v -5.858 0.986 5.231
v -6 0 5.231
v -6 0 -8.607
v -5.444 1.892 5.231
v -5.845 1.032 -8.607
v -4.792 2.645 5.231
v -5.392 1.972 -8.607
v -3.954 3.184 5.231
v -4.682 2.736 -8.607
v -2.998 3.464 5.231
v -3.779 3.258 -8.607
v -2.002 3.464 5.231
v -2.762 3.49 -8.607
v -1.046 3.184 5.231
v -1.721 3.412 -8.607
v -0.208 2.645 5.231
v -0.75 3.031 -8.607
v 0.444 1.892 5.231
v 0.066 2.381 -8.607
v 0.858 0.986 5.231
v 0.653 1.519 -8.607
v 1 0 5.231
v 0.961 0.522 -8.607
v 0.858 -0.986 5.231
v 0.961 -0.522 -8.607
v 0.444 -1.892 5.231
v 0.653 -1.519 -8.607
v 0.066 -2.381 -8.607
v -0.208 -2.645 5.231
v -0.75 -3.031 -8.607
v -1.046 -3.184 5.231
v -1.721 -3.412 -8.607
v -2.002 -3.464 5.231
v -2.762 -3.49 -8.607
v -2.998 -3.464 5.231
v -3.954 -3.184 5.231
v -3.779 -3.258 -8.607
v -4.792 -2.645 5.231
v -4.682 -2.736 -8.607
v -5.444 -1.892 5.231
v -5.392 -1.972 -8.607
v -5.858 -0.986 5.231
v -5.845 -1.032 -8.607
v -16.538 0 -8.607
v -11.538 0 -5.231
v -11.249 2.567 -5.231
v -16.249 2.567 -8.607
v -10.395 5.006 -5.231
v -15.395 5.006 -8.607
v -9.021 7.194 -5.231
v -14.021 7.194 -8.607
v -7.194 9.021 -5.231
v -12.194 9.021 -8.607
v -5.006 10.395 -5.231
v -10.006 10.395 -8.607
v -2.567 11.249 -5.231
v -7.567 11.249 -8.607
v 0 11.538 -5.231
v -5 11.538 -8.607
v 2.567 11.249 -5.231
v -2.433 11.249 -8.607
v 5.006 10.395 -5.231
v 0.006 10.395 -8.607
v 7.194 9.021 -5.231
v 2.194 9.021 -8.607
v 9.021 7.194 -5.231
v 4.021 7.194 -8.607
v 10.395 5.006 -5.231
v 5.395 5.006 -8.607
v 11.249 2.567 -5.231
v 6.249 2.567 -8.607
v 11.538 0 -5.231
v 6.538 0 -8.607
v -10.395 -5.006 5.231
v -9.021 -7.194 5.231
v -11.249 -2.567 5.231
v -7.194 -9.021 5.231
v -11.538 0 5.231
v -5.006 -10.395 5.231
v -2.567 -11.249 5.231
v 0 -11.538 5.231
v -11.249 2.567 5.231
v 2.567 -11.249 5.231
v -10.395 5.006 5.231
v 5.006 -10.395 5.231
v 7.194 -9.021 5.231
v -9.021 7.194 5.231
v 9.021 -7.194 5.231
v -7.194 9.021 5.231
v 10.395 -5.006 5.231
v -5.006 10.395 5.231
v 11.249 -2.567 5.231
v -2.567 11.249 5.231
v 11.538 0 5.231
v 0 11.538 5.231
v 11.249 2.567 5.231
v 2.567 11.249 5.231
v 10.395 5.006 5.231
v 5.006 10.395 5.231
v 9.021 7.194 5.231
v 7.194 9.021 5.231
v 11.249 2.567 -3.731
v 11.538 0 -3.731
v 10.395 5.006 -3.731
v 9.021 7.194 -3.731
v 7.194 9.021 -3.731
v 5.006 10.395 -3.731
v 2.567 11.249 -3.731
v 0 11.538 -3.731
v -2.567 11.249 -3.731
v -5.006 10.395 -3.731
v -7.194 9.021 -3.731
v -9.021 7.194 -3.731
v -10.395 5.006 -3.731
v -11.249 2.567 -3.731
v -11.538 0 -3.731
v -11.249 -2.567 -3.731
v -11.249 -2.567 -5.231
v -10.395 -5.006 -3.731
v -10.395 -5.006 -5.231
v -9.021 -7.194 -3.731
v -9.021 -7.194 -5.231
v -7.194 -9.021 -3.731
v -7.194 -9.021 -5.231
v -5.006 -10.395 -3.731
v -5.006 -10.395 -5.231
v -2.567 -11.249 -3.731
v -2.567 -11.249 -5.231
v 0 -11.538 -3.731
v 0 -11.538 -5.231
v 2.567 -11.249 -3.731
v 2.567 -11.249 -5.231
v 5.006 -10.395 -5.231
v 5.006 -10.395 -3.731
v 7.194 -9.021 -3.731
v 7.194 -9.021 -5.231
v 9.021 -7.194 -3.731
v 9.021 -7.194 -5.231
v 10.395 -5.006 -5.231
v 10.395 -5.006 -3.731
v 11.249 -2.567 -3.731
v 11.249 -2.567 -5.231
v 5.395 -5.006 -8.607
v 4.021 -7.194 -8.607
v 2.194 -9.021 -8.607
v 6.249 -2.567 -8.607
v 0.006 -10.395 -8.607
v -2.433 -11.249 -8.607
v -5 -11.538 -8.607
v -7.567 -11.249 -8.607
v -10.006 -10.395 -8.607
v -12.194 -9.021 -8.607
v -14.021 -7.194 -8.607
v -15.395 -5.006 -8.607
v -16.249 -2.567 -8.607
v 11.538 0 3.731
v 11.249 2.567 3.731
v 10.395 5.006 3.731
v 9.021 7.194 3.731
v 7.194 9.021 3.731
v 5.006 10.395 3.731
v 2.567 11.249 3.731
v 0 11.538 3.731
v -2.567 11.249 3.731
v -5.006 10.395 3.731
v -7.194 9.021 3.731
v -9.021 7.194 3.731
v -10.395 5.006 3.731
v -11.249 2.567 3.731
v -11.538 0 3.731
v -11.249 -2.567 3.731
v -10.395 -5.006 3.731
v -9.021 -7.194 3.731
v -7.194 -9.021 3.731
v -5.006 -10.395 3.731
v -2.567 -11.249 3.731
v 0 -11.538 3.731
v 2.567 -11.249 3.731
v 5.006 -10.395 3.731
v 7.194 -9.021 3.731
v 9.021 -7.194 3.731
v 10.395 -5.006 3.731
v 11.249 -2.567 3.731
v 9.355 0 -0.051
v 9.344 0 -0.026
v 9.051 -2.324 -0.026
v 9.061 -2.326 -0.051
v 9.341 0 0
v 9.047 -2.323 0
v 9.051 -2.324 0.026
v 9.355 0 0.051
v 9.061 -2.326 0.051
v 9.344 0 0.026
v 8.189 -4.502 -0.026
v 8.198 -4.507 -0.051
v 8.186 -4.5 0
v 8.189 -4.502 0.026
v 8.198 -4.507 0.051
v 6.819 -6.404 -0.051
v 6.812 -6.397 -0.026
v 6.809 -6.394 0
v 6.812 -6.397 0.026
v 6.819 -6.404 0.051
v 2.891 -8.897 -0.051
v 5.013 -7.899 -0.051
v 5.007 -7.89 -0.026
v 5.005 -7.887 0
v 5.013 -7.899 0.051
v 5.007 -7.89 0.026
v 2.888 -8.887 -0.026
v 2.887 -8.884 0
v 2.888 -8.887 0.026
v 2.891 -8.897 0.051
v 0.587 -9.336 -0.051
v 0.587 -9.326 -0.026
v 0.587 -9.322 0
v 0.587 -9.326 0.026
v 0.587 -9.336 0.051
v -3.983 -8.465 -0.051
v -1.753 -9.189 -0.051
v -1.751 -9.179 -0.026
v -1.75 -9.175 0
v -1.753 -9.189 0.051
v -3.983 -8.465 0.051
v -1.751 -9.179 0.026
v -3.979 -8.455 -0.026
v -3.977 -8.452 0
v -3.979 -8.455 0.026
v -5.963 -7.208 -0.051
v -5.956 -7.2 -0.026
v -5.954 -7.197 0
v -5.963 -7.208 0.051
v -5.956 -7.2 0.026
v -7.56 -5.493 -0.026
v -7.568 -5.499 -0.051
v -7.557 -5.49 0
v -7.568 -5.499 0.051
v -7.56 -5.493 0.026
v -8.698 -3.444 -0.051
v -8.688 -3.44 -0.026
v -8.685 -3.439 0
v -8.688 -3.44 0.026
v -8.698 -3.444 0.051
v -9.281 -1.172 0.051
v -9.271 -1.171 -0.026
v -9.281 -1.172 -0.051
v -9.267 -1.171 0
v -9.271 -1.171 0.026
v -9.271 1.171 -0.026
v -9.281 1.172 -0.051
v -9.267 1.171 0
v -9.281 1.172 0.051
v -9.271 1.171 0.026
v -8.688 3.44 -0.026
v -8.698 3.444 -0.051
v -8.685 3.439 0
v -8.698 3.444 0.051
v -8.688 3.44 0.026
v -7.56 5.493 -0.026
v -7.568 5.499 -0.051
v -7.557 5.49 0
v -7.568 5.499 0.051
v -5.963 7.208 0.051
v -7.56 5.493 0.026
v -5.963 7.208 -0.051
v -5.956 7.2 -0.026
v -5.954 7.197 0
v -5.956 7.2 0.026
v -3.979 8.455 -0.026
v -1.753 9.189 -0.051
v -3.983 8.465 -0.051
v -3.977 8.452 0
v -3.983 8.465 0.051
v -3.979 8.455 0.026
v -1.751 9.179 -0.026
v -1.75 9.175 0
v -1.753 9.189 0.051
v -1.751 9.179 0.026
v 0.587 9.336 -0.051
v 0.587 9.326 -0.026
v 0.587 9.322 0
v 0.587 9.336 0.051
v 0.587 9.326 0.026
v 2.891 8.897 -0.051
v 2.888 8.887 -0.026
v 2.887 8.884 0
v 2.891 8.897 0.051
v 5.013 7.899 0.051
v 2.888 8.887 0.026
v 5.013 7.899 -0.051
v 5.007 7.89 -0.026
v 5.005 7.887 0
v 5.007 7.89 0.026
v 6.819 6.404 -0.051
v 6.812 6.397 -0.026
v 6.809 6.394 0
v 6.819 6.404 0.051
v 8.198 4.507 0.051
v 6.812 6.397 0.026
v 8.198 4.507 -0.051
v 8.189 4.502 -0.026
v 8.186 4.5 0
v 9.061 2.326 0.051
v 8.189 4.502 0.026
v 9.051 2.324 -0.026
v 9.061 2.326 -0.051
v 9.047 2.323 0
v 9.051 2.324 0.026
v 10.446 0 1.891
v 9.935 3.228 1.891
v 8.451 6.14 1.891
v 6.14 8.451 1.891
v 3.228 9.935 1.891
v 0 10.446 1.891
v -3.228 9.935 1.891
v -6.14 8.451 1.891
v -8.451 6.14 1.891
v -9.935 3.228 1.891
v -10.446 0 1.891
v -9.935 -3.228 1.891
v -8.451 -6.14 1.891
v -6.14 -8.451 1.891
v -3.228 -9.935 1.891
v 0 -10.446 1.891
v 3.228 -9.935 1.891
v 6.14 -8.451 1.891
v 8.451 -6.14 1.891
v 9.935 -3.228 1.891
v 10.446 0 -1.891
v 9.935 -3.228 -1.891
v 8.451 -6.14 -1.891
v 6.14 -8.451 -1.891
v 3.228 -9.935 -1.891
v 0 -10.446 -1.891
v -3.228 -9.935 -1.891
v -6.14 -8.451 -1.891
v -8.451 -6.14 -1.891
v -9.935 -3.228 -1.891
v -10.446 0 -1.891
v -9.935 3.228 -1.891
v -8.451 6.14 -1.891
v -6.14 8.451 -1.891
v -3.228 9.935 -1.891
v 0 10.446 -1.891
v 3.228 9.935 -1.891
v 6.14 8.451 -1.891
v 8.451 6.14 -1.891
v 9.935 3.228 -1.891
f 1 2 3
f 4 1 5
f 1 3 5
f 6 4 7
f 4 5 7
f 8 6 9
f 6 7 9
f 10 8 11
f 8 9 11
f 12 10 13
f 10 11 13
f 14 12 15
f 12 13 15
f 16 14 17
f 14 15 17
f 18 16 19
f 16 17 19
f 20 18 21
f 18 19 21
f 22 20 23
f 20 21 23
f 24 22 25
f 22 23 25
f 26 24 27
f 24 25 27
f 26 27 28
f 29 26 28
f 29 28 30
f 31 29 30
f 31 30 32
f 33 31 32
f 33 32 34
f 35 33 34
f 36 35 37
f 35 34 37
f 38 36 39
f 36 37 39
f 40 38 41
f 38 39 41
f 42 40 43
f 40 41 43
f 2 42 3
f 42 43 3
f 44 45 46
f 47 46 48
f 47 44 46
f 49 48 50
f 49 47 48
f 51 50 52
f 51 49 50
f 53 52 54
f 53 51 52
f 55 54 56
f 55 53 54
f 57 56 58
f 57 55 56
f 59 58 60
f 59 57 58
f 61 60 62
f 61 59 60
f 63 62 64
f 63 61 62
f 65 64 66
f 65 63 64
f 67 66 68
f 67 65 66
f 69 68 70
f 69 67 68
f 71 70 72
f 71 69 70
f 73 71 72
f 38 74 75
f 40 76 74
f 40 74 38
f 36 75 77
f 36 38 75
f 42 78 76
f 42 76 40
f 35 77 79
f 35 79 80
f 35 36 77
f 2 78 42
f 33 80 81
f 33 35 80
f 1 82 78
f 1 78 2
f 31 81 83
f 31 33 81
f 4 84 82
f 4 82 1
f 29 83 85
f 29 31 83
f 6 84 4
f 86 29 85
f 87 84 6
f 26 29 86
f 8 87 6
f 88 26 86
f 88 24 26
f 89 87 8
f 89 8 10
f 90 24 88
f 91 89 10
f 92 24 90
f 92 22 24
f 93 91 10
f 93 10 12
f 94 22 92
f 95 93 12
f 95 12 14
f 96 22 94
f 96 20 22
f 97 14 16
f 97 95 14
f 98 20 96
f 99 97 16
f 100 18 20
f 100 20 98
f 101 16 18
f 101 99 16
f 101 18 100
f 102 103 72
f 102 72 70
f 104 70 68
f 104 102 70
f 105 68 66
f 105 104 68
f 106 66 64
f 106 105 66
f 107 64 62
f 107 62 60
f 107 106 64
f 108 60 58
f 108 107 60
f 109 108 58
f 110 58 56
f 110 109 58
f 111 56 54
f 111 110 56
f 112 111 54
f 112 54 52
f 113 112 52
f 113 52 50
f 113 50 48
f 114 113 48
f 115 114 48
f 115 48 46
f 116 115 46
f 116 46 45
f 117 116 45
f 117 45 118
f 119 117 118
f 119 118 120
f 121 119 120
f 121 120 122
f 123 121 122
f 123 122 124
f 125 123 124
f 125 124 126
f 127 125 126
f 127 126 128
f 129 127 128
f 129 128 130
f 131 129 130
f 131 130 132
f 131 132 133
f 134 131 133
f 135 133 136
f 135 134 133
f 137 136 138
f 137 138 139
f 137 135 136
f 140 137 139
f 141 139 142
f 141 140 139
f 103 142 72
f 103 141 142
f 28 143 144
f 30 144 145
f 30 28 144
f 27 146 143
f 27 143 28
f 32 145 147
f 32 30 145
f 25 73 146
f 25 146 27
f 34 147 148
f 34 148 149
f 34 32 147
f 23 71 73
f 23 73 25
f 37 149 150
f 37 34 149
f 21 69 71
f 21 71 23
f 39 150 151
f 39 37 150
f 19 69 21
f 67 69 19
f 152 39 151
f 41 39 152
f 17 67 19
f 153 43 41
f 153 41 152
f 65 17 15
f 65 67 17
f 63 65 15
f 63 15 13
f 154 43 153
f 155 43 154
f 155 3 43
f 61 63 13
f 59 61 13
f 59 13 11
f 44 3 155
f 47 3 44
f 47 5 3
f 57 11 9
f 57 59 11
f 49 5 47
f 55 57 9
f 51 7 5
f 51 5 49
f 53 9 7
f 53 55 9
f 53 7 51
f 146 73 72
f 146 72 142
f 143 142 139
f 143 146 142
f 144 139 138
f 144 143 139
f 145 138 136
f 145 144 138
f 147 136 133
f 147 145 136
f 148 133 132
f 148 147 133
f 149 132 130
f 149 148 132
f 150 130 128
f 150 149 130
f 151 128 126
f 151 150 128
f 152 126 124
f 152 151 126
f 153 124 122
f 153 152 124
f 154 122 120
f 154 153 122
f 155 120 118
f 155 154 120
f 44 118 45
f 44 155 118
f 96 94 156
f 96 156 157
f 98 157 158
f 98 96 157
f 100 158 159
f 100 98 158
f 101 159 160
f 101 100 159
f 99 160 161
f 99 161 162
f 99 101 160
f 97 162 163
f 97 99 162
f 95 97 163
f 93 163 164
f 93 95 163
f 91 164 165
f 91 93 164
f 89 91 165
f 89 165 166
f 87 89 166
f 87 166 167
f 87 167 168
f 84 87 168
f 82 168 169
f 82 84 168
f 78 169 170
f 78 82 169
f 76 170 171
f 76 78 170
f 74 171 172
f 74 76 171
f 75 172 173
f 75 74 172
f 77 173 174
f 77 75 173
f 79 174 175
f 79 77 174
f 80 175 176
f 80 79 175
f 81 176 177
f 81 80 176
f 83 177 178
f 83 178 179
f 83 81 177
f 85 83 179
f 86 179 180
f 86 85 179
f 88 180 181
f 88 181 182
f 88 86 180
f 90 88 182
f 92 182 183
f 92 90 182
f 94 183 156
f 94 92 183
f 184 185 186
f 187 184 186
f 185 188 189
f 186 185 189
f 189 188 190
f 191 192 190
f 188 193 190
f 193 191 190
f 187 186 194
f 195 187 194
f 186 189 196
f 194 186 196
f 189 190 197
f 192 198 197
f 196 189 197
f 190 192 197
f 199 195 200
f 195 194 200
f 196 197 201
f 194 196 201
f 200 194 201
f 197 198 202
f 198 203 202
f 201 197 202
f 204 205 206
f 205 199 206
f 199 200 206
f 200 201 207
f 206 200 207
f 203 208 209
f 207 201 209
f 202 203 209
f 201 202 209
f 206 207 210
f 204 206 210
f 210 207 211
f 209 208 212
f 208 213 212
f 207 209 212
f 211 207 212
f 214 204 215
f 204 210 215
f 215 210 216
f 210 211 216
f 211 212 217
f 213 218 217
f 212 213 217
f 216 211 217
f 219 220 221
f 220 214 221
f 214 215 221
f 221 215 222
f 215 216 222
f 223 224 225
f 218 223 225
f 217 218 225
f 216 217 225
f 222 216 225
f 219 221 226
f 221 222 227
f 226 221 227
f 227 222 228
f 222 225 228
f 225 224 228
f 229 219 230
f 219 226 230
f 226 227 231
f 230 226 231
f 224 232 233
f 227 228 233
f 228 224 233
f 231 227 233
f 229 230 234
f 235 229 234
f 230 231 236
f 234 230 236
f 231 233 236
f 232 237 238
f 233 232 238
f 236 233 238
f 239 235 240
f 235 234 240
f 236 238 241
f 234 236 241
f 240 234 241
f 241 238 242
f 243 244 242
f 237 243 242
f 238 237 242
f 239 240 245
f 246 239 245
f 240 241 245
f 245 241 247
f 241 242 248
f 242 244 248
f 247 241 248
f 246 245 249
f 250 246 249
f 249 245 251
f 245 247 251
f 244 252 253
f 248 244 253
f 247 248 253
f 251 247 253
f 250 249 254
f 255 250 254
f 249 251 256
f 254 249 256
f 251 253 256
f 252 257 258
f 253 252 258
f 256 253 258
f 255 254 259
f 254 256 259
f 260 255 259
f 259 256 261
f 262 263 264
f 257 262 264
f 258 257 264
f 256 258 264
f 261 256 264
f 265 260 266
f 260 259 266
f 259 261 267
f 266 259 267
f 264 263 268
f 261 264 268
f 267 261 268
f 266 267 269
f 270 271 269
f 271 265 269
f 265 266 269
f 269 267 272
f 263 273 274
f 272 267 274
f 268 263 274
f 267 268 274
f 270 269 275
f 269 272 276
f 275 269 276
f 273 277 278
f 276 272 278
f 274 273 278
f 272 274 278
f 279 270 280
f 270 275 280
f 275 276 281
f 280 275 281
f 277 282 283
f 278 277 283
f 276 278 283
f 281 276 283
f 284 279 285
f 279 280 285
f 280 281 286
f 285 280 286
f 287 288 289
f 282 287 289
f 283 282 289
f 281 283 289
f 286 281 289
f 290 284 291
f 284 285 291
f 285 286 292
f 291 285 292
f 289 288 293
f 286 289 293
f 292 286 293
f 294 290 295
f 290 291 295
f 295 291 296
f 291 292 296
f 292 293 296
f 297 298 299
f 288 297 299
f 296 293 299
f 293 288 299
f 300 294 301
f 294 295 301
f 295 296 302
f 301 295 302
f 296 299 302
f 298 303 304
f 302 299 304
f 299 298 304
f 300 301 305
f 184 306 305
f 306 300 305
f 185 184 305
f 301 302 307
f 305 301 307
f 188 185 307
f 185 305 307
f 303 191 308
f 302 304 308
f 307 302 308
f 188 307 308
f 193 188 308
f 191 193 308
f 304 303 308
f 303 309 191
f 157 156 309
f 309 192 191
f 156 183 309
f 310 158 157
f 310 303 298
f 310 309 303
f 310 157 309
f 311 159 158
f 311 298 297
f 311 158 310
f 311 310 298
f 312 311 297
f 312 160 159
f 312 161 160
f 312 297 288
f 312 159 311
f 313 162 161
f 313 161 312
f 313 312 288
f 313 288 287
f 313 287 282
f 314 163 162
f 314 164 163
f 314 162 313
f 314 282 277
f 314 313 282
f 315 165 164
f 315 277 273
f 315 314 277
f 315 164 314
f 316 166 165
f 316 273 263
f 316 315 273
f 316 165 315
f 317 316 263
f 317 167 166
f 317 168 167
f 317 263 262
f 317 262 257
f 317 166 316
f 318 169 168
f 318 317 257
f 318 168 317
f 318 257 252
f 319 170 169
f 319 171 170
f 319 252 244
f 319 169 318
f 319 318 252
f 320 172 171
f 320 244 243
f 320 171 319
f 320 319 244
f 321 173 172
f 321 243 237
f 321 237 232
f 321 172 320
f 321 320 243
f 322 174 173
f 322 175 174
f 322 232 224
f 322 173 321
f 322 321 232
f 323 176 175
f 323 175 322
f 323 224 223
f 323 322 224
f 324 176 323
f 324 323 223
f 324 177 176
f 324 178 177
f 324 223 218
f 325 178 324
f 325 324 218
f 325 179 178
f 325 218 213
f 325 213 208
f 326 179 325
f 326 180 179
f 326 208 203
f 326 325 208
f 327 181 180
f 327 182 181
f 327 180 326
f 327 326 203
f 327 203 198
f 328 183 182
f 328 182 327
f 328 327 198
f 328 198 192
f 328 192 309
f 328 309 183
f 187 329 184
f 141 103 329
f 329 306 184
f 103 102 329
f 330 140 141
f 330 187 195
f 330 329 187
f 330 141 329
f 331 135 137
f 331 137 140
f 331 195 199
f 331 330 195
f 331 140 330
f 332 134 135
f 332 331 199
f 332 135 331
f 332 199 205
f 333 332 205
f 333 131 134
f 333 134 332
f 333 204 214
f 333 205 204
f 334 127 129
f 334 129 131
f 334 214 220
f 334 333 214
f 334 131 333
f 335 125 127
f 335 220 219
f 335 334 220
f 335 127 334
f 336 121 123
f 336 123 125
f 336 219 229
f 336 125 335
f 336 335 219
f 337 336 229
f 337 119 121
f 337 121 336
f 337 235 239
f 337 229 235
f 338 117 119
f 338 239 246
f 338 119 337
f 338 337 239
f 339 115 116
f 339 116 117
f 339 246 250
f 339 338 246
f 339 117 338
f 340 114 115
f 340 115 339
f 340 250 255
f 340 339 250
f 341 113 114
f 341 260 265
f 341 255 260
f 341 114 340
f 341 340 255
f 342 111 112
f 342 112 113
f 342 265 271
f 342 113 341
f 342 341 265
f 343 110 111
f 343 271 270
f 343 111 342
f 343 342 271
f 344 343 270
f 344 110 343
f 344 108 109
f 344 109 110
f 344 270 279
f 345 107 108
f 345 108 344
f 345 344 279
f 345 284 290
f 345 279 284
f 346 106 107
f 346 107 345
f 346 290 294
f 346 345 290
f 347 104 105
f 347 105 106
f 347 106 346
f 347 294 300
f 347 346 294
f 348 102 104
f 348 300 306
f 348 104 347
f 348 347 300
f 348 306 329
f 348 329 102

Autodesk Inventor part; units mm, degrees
ref_plane "XZ Plane" through (0, 0, 0) normal (0, 1, 0) x (-1, 0, 0)
sketch "Sketch7" plane through (0, 0, 0) normal (0, 1, 0) x (-1, 0, 0)
  line L0 (0, 0) -> (0, 15.7673)
  line L1 (0, 0) -> (-13.3368, 0) construction
  line L2 (0, 15.7673) -> (-13.3368, 0) construction
  line L3 (0, 15.7673) -> (-18.6413, 0) construction
  line L4 (0, 15.7673) -> (-12.4569, -5.231) construction
  line L5 (0, 0) -> (0, -15.7673)
  line L6 (0, -15.7673) -> (-13.3368, 0) construction
  line L7 (0, -15.7673) -> (-18.6413, 0) construction
  line L8 (0, -15.7673) -> (-12.4569, 5.231) construction
  line L9 (-12.4569, 5.231) -> (-18.6413, 0) construction
  line L10 (-9.3537, 0) -> (-18.5948, -7.8164) construction
  line L11 (-9.3537, 0) -> (-18.0926, 7.3915) construction
  line L12 (0, -29.7093) -> (0, 66.7435) projected
  line L13 (-53.5, -5.9919) -> (-53.5, 6.008)
  line L14 (17.5786, 0) -> (-94.9714, 0) projected
  line L15 (-15.989, 2.2434) -> (-10.6846, -2.2434) construction
  line L16 (-10.6846, 2.2434) -> (-15.989, -2.2434) construction
  line L17 (-26.151, -15.9303) -> (-40.3783, -15.9303) construction
  line L18 (-40.3783, -15.9303) -> (-40.3783, -12.7539) construction
  line L19 (-40.3783, -12.7539) -> (-26.151, -12.7539) construction
  line L20 (-26.151, -12.7539) -> (-26.151, -15.9303) construction
  point P0 (-53.5, 0)
  dimension "Roller_Side_difference" = -0.0003
  dimension "d90" = 15.7673
  dimension "d201" = 53.5
  dimension "d343" = 99.548
  dimension "d344" = 99.549
  dimension "d367" = 8.1
sketch "Roller1" plane through (0, 0, 0) normal (0, 1, 0) x (-1, 0, 0)
  line L0 (0, 15.7673) -> (-12.4569, -5.231) construction
  line L1 (0, 15.7673) -> (-18.6413, 0) construction
  line L2 (-9.3537, 0) -> (-18.0926, 7.3915) construction
  line L3 (0, -15.7673) -> (-18.6413, 0) construction
  line L4 (-9.4248, -0.0708) -> (-12.4245, -5.1274)
  line L5 (-12.4245, -5.1274) -> (-18.5445, 0.0491)
  line L6 (-18.5445, 0.0491) -> (-14.0556, 3.846)
  line L7 (-14.0556, 3.846) -> (-9.4248, -0.0708)
  line L8 (-11.7456, 1.8921) -> (-15.4898, -2.5346)
  line L9 (-10.9821, 1.2463) -> (-14.7263, -3.1804)
  point P0 (0, 0)
  point P1 (-15.4845, -2.5391)
  dimension "d345" = 0.025
  dimension "d346" = 0.025
  dimension "d347" = 0.1
  dimension "d348" = 0.1
  dimension "d349" = 99.549
  dimension "d350" = 99.548
  dimension "d357" = 1
  dimension "d369" = 4.0148
sketch "Sketch1" plane through (0, 0, 0) normal (0, 0, 1) x (1, 0, 0)
  circle A0 centre (0, 0) radius 13.3368 construction
  line L0 (0, 0) -> (13.3368, 0)
  line L1 (0, 0) -> (13.3368, 4.025)
  line L2 (13.3368, 0) -> (13.3368, 4.025)
  circle A1 centre (0, 0) radius 53.5
  dimension "d56" = 13.3368
  dimension "d57" = 4.025
  dimension "d400" = 53.5
  dimension "d495" = 2.5
  dimension "d496" = 8
  dimension "d531" = 5.5
  dimension "d532" = 5.5
  dimension "d533" = 5.5
  dimension "d537" = 24.5
  dimension "d538" = 3
  dimension "d543" = 5.5
  dimension "d549" = 3
  dimension "d550" = 3
  dimension "d567" = 5.5
  dimension "d568" = 5.5
sketch "Roller2" plane through (0, 0, 0) normal (0, 1, 0) x (-1, 0, 0)
  line L0 (0, -15.7673) -> (-12.4569, 5.231) construction
  line L1 (-9.3537, 0) -> (-18.5948, -7.8164) construction
  line L2 (0, -15.7673) -> (-18.6413, 0) construction
  line L3 (0, 15.7673) -> (-18.6413, 0) construction
  line L4 (-12.4633, 5.1928) -> (-9.386, 0.0054)
  line L5 (-9.386, 0.0054) -> (-13.9975, -3.8951)
  line L6 (-13.9975, -3.8951) -> (-18.6026, 0)
  line L7 (-18.6026, 0) -> (-12.4633, 5.1928)
  line L8 (-15.533, 2.5964) -> (-11.6918, -1.9449)
  line L9 (-14.7694, 3.2422) -> (-10.9283, -1.2991)
  point P0 (0, 0)
  dimension "d351" = 0.025
  dimension "d352" = 0.025
  dimension "d354" = 0.025
  dimension "d355" = 99.548
  dimension "d356" = 99.549
  dimension "d370" = 0.025
  dimension "d371" = 1
sketch "Sketch22" plane through (0, 0, 0) normal (0, 1, 0) x (-1, 0, 0)
  line L0 (-31.756, 8.0215) -> (-17.5287, 8.0215) construction
  line L1 (-17.5287, 8.0215) -> (-17.5287, 4.8451) construction
  line L2 (-17.5287, 4.8451) -> (-31.756, 4.8451) construction
  line L3 (-31.756, 4.8451) -> (-31.756, 8.0215) construction
  point P0 (0, 0)
  dimension "Roller_Side_difference" = -0.0003
sketch "Sketch2" plane through (0, 0, 0) normal (0, 1, 0) x (-1, 0, 0)
  line L0 (0, 0) -> (0, 13.3368) construction
  line L1 (0, 0) -> (-13.3368, 0) projected
  line L2 (0, 0) -> (0, -13.3368)
  line L3 (0, -13.3368) -> (-13.3368, 0) construction
  line L4 (0, 13.3368) -> (-13.3368, 0) construction
  line L5 (-78.8928, 52.9645) -> (0, 13.3368) construction
  line L6 (-34.8011, 15.91) -> (0, 13.3368) construction
  line L7 (-34.8011, 15.91) -> (0, -13.3368) construction
  line L8 (-48.3339, 16.9106) -> (0, -13.3368) construction
  point P0 (-17.4708, -4.134)
sketch "Sketch23" plane through (0, 0, 0) normal (0, 1, 0) x (-1, 0, 0)
  line L0 (0, -15.7673) -> (-12.4569, 5.231) construction
  line L1 (0, -15.7673) -> (-18.6413, 0) construction
  line L2 (0, 15.7673) -> (-12.4569, -5.231) construction
  line L3 (-12.4569, 5.231) -> (-18.6413, 0) construction
  line L4 (0, 15.7673) -> (-18.6413, 0) construction
  line L5 (-12.4569, 5.231) -> (-12.4569, -5.231) construction
  line L6 (17.5786, 0) -> (-94.9714, 0) projected
  line L7 (-11.538, 3.731) -> (-9.3549, 0.051)
  line L8 (-9.3549, -0.051) -> (-11.538, -3.731)
  line L9 (-14.269, 3.731) -> (-18.5898, 0.0764)
  line L10 (-18.5898, -0.0764) -> (-14.269, -3.731)
  arc A0 (-18.5898, 0.0764) -> (-18.5898, -0.0764) centre (-18.5252, 0) ccw
  arc A1 (-9.3549, -0.051) -> (-9.3549, 0.051) centre (-9.4409, 0) ccw
  line L11 (-11.538, 3.731) -> (-11.538, 5.231)
  line L12 (-11.538, 5.231) -> (-1, 5.231)
  line L13 (-1, 5.231) -> (-1, -5.231)
  line L14 (-1, -5.231) -> (-11.538, -5.231)
  line L15 (-11.538, -5.231) -> (-11.538, -3.731)
  line L16 (-14.269, 3.731) -> (-14.269, 5.231)
  line L17 (-14.269, 5.231) -> (-53.5, 5.231)
  line L18 (-53.5, 5.231) -> (-53.5, -5.231)
  line L19 (-14.269, -3.731) -> (-14.269, -5.231)
  line L20 (-14.269, -5.231) -> (-53.5, -5.231)
  line L21 (-12.4569, 5.231) -> (-12.4569, 5.231)
  line L22 (-12.4569, -5.231) -> (-12.4569, -5.231)
  line L23 (0, -29.7093) -> (0, 66.7435) projected
  line L24 (-18.68, 0) -> (-53.5, 0)
  point P0 (0, 0)
  point P1 (-9.3246, 0)
  point P2 (-18.6252, 0)
  point P3 (-53.5, 0)
  dimension "d378" = 90
  dimension "d379" = 0.1
  dimension "d380" = 0.025
  dimension "d381" = 0.025
  dimension "d382" = 0.025
  dimension "d383" = 0.025
  dimension "d384" = 10.4619
  dimension "d385" = 0
  dimension "d386" = 0
  dimension "d391" = 1
  dimension "d392" = 53.5
  dimension "d393" = 1.5
  dimension "d394" = 1.5
  dimension "d395" = 1.5
  dimension "d396" = 1.5
revolve "RevRoller1" [suppressed]
fillet "Fillet1" [suppressed]
pattern_circular "Circular Pattern13" [suppressed]
feature "Move Body7" [suppressed]
revolve "Revolution13" [suppressed]
fillet "Fillet3" [suppressed]
pattern_circular "Circular Pattern14" [suppressed]
feature "Move Body6" [suppressed]
revolve "Revolution14" add sketch "Sketch23" angle 360 about axis through (0, 0, -10) along (0, 0, 1) contours L13 L14 L15 L8 A1 L6 | L6 A1 L7 L11 L12 L13
ref_plane "Work Plane7" through (0, 0, -25.231) normal (0, 0, -1) x (-1, 0, 0)
sketch "Sketch44" plane through (0, 0, -25.231) normal (0, 0, -1) x (-1, 0, 0)
  circle A0 centre (5, 0) radius 11.538
  line L0 (5, 0) -> (2.5, 0)
  circle A1 centre (2.5, 0) radius 3.5
  point P0 (0, 0)
  dimension "d621" = 2.5
  dimension "d622" = 7
ref_plane "Work Plane8" through (0, 0, -8.607) normal (0, 0, -1) x (-1, 0, 0)
sketch "Sketch45" plane through (0, 0, -8.607) normal (0, 0, -1) x (-1, 0, 0)
  circle A0 centre (5, 0) radius 11.538 projected
  point P0 (0, 0)
loft "Loft1" add profiles "Sketch45" section 1 edges at (-11.538, 0, -5.231)
sketch "Sketch46" plane through (0, 0, 5.231) normal (0, 0, 1) x (1, 0, 0)
  point P0 (0, 0)
extrude "Extrusion39" cut sketch "Sketch44" against normal through all contours A1
ref_plane "Work Plane9" through (50, 0, 0) normal (1, 0, 0) x (0, 1, 0)
sketch "Sketch47" plane through (50, 0, 0) normal (1, 0, 0) x (0, 1, 0)
  line L0 (9.3549, 0.051) -> (-9.3549, 0.051) construction
  circle A0 centre (0, 0) radius 2.75
  circle A1 centre (0, 0) radius 1.5
  line L1 (-1.5877, -2.75) -> (-3.1754, 0)
  line L2 (-3.1754, 0) -> (-1.5877, 2.75)
  line L3 (-1.5877, 2.75) -> (1.5877, 2.75)
  line L4 (1.5877, 2.75) -> (3.1754, 0)
  line L5 (3.1754, 0) -> (1.5877, -2.75)
  line L6 (1.5877, -2.75) -> (-1.5877, -2.75)
  dimension "d626" = 5.5
  dimension "d627" = 3
  dimension "d628" = 5.5
extrude "Extrusion40" [suppressed]
extrude "Extrusion41" [suppressed]
extrude "Extrusion42" [suppressed]
sketch "Sketch40" plane through (0, 0, -5.231) normal (0, 0, -1) x (-1, 0, 0)
  circle A0 centre (53.5, 0) radius 2.75 projected
  circle A1 centre (0, 0) radius 53.5 projected
  point P0 (53.4293, 2.7491)
  point P1 (53.4293, -2.7491)
  dimension "d585" = 8
  dimension "d587" = 1.75
  dimension "d589" = 3
  dimension "d592" = 2
  dimension "d593" = 12
  dimension "d594" = 12
  dimension "d611" = 360
equation "\"Roller_Side_difference\" = -0.001568deg"
equation "\"Cycloid_Top_Plate_Fasner_Inner\" = 61.25"
equation "\"Cycloid_Top_Plate_Fasner_Outer\" = 85.75"
equation "\"Roller_Hole_Radius\" = 1"
equation "\"Distance_To_Bearing\" = 20.65135"
equation "\"d514\" = 0.2"
properties part number "Axle_Printing_TestsRotor_TSB"
